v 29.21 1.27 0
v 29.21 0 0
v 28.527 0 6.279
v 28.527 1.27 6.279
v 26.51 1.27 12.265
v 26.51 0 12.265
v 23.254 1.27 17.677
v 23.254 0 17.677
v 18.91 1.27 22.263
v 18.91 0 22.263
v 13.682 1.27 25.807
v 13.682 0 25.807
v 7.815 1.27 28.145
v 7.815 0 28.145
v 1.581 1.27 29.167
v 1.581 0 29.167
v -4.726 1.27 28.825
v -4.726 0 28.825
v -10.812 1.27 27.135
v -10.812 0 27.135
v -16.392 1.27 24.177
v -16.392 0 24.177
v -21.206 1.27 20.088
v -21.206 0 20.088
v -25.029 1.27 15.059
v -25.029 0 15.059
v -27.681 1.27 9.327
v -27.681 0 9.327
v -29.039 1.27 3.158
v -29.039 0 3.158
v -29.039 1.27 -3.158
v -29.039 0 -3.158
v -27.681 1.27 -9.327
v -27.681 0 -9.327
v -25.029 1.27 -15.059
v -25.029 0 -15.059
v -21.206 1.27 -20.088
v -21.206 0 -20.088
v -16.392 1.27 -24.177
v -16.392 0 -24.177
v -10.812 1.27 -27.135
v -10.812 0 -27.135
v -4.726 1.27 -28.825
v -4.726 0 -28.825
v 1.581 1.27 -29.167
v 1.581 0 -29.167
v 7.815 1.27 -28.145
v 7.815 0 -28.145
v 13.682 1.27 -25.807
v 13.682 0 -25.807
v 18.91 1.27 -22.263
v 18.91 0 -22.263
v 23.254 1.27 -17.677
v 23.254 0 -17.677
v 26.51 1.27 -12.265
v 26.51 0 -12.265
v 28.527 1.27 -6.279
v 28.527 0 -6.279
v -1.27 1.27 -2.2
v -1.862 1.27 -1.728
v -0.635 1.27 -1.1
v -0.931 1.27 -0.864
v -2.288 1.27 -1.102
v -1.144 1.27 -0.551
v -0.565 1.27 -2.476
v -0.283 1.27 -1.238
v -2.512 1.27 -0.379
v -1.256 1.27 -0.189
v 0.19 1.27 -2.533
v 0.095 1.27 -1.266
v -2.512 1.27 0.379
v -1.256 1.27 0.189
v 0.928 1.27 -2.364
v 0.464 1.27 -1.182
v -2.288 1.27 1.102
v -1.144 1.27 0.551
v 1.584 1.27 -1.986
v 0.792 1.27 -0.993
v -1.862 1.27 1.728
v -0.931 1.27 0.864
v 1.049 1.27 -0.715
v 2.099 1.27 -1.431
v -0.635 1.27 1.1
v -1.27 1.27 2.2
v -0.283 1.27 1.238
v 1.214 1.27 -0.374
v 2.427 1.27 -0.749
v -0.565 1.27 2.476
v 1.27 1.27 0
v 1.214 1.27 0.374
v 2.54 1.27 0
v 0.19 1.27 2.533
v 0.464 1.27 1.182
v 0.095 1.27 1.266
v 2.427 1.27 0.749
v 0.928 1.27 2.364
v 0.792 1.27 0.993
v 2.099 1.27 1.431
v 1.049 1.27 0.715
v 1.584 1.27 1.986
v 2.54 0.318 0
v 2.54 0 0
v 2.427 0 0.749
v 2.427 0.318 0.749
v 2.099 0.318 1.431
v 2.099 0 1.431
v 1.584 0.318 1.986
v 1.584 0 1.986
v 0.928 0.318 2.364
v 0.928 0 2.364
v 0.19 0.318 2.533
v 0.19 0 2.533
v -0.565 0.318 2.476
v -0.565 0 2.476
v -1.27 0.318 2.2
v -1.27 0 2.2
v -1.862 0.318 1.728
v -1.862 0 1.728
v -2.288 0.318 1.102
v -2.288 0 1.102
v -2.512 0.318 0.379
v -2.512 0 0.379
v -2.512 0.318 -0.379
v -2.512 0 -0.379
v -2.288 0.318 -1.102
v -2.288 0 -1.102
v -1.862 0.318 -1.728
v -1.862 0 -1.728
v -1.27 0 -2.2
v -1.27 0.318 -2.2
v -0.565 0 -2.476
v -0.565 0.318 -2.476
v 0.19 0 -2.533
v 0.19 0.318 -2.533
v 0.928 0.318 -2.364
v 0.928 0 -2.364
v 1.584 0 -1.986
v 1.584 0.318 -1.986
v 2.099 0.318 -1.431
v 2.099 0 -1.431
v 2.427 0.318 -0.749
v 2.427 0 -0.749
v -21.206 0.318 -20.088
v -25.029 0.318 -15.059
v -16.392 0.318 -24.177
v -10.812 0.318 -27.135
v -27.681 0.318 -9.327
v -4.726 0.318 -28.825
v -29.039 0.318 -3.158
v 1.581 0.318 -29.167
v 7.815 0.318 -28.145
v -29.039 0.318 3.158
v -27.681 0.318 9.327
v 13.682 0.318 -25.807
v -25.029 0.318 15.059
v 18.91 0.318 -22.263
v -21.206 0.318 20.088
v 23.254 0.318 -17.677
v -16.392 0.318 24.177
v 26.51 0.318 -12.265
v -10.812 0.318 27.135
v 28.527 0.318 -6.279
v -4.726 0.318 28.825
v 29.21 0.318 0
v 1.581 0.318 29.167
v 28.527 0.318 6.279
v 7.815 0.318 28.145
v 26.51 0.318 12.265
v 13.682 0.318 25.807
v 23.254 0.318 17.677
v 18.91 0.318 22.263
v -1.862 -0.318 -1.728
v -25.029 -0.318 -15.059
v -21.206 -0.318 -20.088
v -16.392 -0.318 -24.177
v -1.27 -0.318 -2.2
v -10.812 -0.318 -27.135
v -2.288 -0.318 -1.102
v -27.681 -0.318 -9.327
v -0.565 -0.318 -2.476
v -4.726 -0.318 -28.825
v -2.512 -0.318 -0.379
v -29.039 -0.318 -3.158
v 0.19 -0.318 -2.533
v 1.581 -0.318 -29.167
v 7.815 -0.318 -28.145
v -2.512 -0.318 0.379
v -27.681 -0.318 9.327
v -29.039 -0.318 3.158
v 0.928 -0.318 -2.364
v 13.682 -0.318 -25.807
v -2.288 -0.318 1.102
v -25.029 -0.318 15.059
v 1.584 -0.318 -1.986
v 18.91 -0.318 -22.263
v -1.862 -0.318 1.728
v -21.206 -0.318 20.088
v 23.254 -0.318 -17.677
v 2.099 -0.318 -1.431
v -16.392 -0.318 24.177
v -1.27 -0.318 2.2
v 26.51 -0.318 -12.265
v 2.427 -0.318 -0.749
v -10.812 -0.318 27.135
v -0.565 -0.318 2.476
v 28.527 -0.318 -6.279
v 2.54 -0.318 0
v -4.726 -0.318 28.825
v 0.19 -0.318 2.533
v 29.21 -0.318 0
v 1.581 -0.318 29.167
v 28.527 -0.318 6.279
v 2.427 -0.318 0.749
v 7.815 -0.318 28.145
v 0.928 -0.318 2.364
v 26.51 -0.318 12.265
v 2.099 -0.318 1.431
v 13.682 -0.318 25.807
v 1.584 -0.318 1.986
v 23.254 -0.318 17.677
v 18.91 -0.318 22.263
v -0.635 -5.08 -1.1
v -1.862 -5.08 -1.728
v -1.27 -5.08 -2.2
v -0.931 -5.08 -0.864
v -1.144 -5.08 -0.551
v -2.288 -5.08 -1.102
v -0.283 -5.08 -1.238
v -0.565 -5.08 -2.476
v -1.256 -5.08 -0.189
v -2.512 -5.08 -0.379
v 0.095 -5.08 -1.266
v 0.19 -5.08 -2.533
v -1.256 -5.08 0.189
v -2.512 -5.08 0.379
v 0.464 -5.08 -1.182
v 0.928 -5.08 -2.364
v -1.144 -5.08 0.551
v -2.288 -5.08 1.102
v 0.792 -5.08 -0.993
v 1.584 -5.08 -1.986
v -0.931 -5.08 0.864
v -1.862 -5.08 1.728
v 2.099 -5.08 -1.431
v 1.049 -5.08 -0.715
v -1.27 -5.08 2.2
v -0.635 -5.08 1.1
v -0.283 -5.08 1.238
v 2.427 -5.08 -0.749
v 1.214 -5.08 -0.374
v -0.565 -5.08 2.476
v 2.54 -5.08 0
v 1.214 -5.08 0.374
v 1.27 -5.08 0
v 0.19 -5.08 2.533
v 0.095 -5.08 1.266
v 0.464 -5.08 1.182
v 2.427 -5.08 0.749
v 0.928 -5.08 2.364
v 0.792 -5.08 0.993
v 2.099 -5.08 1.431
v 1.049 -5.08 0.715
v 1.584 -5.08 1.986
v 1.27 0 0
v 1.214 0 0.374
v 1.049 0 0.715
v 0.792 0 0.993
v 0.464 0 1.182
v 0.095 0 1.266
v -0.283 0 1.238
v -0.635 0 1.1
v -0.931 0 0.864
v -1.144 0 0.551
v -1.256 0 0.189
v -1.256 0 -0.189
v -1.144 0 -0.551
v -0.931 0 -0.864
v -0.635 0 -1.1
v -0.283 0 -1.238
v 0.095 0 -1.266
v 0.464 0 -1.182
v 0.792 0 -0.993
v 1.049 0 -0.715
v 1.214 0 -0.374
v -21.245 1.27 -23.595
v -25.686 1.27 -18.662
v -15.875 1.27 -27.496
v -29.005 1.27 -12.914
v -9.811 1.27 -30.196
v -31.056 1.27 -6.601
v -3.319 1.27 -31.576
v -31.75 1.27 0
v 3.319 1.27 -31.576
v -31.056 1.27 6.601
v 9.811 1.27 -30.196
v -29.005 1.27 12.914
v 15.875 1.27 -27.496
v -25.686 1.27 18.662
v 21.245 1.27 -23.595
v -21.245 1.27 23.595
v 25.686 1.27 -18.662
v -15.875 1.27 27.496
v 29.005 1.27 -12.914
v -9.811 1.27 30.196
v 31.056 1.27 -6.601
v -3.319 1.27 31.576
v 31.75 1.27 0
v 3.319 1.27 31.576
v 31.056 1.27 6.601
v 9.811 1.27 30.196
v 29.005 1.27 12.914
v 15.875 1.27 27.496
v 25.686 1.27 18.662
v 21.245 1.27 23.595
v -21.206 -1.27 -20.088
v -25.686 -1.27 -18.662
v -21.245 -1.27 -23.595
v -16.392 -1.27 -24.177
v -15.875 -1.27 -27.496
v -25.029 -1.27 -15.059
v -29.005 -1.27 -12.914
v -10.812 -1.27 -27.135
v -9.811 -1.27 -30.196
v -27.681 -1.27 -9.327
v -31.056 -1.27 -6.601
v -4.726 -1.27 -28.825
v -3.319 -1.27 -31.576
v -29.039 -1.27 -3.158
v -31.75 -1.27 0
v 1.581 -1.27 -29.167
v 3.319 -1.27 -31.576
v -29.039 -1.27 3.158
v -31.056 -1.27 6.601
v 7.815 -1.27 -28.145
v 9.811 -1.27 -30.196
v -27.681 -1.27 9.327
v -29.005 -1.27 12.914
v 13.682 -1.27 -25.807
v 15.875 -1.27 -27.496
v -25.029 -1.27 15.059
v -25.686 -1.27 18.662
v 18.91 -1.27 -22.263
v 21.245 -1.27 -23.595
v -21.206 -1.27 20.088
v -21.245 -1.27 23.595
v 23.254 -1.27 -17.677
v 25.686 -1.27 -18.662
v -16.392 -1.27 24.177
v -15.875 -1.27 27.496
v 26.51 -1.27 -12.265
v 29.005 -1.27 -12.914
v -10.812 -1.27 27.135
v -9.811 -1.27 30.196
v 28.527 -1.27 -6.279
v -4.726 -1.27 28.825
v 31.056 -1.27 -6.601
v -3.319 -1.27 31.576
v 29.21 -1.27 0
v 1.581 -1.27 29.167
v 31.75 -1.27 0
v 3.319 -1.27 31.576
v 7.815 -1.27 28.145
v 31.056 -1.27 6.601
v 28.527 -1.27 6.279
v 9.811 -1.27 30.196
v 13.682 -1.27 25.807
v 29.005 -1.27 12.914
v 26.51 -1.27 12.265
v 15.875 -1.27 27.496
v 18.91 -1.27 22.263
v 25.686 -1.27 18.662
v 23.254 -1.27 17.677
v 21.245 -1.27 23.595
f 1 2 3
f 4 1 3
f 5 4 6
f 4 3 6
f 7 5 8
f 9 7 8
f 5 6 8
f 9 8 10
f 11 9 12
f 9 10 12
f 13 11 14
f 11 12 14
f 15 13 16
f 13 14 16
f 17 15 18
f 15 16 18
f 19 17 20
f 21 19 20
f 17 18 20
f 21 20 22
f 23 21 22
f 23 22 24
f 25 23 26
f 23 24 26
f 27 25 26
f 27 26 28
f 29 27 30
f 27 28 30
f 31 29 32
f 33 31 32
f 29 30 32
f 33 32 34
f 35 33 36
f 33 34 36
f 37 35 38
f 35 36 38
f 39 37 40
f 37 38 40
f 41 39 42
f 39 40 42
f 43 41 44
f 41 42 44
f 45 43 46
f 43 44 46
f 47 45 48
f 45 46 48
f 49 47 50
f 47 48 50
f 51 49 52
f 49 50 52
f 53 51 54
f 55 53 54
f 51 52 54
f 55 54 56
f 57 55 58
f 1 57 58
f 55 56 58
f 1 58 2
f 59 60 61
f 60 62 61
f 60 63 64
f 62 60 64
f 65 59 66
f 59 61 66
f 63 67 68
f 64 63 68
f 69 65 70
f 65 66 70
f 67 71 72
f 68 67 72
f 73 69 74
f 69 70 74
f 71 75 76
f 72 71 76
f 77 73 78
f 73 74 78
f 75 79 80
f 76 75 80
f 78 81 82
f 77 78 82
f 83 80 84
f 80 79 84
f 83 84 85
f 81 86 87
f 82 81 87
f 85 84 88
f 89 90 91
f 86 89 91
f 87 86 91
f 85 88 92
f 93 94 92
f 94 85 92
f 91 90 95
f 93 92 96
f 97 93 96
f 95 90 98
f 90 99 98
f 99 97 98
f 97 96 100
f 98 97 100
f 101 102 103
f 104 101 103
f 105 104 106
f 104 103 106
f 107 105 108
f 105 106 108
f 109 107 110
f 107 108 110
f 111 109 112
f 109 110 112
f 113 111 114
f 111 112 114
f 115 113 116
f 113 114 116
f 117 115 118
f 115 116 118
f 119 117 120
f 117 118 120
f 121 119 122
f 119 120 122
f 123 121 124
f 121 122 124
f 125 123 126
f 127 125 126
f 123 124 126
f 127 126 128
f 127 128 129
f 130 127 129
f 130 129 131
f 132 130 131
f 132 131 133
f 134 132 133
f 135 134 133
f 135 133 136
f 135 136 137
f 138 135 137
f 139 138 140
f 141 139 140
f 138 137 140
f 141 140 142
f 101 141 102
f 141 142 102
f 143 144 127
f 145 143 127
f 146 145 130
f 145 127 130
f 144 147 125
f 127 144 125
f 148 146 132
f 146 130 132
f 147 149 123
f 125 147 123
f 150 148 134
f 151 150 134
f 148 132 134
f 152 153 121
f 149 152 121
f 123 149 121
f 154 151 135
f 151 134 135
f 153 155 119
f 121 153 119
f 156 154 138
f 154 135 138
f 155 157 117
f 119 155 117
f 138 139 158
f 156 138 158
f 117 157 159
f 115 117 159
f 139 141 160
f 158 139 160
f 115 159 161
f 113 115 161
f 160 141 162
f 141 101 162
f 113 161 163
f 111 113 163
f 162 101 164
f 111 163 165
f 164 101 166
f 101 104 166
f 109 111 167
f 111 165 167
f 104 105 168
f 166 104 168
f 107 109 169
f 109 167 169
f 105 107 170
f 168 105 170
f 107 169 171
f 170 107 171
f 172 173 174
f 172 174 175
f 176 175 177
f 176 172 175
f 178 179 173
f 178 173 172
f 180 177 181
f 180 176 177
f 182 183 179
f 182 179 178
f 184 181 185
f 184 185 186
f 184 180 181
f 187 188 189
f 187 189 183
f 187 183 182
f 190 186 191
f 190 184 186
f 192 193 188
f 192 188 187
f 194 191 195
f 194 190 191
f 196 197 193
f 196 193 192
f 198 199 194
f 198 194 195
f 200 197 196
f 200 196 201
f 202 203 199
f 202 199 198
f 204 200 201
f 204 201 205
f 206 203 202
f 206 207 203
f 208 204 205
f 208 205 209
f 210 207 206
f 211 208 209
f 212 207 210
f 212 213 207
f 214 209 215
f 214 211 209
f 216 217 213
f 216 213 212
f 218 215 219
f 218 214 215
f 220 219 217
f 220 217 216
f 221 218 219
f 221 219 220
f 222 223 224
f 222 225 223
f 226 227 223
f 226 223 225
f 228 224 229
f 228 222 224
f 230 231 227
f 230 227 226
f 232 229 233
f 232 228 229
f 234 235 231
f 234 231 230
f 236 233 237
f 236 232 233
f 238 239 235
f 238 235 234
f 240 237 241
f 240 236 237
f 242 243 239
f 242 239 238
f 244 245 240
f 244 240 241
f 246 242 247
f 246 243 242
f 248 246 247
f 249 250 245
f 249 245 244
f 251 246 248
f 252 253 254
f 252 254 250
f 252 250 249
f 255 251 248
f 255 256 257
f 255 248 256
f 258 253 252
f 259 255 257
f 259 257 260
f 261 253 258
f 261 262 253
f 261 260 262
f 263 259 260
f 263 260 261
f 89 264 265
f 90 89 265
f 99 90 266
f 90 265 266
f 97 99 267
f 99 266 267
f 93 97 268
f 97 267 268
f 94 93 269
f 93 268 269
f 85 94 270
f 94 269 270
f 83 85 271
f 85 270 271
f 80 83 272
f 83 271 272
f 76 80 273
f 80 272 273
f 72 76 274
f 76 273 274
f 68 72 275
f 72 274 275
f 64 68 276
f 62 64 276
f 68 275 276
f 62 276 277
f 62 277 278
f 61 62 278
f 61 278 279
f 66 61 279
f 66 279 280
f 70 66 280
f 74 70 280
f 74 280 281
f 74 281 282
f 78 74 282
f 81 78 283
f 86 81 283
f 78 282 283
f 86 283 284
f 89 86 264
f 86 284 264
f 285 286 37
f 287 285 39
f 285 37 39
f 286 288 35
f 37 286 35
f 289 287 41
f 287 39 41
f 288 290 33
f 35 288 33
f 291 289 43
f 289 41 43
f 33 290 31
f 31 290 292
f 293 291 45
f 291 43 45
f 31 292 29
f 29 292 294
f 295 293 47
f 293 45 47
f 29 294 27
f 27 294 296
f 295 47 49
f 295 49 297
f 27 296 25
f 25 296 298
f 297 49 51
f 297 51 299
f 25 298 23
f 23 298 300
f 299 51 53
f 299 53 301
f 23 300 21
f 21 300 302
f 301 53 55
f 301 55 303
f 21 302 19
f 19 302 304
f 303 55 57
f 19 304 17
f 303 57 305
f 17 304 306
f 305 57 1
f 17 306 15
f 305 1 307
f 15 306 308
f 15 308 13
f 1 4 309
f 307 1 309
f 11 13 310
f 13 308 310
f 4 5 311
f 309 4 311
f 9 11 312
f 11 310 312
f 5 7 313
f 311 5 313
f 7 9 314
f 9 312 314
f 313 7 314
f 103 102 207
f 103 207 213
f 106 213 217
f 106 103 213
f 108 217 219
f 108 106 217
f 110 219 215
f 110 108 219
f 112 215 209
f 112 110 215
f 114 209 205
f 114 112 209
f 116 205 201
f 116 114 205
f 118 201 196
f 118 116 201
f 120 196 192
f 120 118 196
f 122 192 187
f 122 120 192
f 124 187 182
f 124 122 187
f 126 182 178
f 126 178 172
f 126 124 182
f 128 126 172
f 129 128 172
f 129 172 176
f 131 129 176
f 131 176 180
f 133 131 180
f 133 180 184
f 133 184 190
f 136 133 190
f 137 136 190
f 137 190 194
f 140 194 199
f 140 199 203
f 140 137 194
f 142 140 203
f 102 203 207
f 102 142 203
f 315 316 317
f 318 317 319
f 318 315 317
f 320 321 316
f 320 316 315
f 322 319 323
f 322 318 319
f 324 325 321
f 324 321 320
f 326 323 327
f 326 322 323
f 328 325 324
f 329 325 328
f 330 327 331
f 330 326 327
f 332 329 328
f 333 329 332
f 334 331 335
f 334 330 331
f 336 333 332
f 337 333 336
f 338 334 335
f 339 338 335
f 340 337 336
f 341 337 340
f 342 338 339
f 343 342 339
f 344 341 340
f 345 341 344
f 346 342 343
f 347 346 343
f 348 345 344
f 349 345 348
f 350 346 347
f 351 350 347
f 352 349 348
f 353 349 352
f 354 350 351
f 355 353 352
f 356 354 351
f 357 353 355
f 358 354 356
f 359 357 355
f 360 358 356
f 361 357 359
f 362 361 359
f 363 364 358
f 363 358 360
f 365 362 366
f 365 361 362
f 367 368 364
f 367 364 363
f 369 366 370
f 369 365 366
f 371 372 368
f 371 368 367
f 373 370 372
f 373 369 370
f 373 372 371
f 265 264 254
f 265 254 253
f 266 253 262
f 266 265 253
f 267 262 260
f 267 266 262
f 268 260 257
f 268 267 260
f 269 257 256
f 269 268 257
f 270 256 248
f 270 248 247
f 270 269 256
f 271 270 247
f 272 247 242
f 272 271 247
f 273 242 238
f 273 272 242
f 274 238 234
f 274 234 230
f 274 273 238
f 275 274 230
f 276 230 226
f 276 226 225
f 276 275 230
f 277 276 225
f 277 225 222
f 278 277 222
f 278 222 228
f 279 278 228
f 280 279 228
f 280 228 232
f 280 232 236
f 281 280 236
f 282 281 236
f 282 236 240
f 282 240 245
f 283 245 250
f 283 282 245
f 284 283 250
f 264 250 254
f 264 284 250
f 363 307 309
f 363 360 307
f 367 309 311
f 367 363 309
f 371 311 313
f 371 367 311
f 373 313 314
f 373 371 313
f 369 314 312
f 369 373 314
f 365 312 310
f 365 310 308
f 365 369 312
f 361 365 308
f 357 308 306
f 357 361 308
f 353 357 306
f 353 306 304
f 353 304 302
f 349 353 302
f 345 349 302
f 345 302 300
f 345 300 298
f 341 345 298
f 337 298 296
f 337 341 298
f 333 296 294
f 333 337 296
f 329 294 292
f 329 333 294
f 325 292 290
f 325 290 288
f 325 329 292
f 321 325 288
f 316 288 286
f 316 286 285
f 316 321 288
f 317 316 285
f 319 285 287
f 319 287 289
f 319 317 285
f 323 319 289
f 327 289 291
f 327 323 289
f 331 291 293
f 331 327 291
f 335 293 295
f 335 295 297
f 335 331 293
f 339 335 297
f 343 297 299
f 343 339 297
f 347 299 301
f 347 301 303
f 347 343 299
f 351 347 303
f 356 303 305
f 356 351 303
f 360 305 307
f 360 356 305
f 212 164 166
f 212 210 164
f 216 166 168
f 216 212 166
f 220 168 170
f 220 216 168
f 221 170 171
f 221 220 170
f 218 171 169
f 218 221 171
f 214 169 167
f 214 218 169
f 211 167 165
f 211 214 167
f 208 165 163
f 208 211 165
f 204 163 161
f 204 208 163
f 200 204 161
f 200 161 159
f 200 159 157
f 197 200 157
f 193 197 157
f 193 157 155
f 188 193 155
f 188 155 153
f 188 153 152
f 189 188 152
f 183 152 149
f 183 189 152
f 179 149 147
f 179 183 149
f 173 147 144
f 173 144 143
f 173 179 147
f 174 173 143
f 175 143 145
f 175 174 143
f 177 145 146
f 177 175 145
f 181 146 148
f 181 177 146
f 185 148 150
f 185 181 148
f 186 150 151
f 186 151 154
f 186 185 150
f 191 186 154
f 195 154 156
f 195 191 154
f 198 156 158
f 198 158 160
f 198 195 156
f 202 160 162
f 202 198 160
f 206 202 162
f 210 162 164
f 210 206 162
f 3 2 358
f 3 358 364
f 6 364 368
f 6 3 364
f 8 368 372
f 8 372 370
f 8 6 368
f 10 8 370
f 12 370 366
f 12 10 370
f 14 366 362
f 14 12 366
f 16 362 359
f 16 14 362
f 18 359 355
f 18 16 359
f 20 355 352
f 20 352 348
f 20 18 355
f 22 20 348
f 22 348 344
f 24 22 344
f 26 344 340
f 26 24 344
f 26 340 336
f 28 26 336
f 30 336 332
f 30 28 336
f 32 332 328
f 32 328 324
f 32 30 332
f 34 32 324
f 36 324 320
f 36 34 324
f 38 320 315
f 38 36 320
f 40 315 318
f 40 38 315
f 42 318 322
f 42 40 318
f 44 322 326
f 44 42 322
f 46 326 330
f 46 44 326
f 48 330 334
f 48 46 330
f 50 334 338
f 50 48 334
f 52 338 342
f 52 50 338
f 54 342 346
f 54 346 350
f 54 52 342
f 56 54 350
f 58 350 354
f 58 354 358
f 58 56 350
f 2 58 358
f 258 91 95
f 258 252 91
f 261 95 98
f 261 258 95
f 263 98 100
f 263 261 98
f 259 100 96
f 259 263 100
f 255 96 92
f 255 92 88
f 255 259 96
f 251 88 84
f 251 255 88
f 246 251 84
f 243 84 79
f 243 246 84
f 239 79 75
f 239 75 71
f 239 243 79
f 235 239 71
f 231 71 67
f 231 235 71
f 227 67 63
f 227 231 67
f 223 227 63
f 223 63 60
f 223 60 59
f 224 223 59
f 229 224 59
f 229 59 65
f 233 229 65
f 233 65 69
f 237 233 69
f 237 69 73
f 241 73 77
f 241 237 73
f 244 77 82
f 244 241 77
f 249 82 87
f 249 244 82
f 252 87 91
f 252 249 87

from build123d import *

# Parameters (mm, degrees)
F0_R          = 2.54
F0_R_2        = 1.27
F1_DEPTH      = 5.08
F1_DEPTH_BACK = 1.27
F0_R_3        = 31.75
F0_R_4        = 29.21
F2_DEPTH      = 1.27
F2_DEPTH_BACK = 1.27
F3_DEPTH      = 0.3175
F3_DEPTH_BACK = 0.3175


with BuildPart() as f1:
    # F0 (on Front) → F1 (new body, two sides)
    with BuildSketch(Plane.XZ) as f1_sk:
        Circle(F0_R)
        Circle(F0_R_2, mode=Mode.SUBTRACT)
    extrude(amount=F1_DEPTH)
    extrude(f1_sk.sketch, amount=-F1_DEPTH_BACK)


with BuildPart() as f2:
    # F0 (on Front) → F2 (new body, two sides)
    with BuildSketch(Plane.XZ) as f2_sk:
        Circle(F0_R_3)
        Circle(F0_R_4, mode=Mode.SUBTRACT)
    extrude(amount=F2_DEPTH)
    extrude(f2_sk.sketch, amount=-F2_DEPTH_BACK)


with BuildPart() as f3:
    # F0 (on Front) → F3 (new body, two sides)
    with BuildSketch(Plane.XZ) as f3_sk:
        Circle(F0_R_4)
        Circle(F0_R, mode=Mode.SUBTRACT)
    extrude(amount=F3_DEPTH)
    extrude(f3_sk.sketch, amount=-F3_DEPTH_BACK)


solid = Compound([f1.part, f2.part, f3.part])
